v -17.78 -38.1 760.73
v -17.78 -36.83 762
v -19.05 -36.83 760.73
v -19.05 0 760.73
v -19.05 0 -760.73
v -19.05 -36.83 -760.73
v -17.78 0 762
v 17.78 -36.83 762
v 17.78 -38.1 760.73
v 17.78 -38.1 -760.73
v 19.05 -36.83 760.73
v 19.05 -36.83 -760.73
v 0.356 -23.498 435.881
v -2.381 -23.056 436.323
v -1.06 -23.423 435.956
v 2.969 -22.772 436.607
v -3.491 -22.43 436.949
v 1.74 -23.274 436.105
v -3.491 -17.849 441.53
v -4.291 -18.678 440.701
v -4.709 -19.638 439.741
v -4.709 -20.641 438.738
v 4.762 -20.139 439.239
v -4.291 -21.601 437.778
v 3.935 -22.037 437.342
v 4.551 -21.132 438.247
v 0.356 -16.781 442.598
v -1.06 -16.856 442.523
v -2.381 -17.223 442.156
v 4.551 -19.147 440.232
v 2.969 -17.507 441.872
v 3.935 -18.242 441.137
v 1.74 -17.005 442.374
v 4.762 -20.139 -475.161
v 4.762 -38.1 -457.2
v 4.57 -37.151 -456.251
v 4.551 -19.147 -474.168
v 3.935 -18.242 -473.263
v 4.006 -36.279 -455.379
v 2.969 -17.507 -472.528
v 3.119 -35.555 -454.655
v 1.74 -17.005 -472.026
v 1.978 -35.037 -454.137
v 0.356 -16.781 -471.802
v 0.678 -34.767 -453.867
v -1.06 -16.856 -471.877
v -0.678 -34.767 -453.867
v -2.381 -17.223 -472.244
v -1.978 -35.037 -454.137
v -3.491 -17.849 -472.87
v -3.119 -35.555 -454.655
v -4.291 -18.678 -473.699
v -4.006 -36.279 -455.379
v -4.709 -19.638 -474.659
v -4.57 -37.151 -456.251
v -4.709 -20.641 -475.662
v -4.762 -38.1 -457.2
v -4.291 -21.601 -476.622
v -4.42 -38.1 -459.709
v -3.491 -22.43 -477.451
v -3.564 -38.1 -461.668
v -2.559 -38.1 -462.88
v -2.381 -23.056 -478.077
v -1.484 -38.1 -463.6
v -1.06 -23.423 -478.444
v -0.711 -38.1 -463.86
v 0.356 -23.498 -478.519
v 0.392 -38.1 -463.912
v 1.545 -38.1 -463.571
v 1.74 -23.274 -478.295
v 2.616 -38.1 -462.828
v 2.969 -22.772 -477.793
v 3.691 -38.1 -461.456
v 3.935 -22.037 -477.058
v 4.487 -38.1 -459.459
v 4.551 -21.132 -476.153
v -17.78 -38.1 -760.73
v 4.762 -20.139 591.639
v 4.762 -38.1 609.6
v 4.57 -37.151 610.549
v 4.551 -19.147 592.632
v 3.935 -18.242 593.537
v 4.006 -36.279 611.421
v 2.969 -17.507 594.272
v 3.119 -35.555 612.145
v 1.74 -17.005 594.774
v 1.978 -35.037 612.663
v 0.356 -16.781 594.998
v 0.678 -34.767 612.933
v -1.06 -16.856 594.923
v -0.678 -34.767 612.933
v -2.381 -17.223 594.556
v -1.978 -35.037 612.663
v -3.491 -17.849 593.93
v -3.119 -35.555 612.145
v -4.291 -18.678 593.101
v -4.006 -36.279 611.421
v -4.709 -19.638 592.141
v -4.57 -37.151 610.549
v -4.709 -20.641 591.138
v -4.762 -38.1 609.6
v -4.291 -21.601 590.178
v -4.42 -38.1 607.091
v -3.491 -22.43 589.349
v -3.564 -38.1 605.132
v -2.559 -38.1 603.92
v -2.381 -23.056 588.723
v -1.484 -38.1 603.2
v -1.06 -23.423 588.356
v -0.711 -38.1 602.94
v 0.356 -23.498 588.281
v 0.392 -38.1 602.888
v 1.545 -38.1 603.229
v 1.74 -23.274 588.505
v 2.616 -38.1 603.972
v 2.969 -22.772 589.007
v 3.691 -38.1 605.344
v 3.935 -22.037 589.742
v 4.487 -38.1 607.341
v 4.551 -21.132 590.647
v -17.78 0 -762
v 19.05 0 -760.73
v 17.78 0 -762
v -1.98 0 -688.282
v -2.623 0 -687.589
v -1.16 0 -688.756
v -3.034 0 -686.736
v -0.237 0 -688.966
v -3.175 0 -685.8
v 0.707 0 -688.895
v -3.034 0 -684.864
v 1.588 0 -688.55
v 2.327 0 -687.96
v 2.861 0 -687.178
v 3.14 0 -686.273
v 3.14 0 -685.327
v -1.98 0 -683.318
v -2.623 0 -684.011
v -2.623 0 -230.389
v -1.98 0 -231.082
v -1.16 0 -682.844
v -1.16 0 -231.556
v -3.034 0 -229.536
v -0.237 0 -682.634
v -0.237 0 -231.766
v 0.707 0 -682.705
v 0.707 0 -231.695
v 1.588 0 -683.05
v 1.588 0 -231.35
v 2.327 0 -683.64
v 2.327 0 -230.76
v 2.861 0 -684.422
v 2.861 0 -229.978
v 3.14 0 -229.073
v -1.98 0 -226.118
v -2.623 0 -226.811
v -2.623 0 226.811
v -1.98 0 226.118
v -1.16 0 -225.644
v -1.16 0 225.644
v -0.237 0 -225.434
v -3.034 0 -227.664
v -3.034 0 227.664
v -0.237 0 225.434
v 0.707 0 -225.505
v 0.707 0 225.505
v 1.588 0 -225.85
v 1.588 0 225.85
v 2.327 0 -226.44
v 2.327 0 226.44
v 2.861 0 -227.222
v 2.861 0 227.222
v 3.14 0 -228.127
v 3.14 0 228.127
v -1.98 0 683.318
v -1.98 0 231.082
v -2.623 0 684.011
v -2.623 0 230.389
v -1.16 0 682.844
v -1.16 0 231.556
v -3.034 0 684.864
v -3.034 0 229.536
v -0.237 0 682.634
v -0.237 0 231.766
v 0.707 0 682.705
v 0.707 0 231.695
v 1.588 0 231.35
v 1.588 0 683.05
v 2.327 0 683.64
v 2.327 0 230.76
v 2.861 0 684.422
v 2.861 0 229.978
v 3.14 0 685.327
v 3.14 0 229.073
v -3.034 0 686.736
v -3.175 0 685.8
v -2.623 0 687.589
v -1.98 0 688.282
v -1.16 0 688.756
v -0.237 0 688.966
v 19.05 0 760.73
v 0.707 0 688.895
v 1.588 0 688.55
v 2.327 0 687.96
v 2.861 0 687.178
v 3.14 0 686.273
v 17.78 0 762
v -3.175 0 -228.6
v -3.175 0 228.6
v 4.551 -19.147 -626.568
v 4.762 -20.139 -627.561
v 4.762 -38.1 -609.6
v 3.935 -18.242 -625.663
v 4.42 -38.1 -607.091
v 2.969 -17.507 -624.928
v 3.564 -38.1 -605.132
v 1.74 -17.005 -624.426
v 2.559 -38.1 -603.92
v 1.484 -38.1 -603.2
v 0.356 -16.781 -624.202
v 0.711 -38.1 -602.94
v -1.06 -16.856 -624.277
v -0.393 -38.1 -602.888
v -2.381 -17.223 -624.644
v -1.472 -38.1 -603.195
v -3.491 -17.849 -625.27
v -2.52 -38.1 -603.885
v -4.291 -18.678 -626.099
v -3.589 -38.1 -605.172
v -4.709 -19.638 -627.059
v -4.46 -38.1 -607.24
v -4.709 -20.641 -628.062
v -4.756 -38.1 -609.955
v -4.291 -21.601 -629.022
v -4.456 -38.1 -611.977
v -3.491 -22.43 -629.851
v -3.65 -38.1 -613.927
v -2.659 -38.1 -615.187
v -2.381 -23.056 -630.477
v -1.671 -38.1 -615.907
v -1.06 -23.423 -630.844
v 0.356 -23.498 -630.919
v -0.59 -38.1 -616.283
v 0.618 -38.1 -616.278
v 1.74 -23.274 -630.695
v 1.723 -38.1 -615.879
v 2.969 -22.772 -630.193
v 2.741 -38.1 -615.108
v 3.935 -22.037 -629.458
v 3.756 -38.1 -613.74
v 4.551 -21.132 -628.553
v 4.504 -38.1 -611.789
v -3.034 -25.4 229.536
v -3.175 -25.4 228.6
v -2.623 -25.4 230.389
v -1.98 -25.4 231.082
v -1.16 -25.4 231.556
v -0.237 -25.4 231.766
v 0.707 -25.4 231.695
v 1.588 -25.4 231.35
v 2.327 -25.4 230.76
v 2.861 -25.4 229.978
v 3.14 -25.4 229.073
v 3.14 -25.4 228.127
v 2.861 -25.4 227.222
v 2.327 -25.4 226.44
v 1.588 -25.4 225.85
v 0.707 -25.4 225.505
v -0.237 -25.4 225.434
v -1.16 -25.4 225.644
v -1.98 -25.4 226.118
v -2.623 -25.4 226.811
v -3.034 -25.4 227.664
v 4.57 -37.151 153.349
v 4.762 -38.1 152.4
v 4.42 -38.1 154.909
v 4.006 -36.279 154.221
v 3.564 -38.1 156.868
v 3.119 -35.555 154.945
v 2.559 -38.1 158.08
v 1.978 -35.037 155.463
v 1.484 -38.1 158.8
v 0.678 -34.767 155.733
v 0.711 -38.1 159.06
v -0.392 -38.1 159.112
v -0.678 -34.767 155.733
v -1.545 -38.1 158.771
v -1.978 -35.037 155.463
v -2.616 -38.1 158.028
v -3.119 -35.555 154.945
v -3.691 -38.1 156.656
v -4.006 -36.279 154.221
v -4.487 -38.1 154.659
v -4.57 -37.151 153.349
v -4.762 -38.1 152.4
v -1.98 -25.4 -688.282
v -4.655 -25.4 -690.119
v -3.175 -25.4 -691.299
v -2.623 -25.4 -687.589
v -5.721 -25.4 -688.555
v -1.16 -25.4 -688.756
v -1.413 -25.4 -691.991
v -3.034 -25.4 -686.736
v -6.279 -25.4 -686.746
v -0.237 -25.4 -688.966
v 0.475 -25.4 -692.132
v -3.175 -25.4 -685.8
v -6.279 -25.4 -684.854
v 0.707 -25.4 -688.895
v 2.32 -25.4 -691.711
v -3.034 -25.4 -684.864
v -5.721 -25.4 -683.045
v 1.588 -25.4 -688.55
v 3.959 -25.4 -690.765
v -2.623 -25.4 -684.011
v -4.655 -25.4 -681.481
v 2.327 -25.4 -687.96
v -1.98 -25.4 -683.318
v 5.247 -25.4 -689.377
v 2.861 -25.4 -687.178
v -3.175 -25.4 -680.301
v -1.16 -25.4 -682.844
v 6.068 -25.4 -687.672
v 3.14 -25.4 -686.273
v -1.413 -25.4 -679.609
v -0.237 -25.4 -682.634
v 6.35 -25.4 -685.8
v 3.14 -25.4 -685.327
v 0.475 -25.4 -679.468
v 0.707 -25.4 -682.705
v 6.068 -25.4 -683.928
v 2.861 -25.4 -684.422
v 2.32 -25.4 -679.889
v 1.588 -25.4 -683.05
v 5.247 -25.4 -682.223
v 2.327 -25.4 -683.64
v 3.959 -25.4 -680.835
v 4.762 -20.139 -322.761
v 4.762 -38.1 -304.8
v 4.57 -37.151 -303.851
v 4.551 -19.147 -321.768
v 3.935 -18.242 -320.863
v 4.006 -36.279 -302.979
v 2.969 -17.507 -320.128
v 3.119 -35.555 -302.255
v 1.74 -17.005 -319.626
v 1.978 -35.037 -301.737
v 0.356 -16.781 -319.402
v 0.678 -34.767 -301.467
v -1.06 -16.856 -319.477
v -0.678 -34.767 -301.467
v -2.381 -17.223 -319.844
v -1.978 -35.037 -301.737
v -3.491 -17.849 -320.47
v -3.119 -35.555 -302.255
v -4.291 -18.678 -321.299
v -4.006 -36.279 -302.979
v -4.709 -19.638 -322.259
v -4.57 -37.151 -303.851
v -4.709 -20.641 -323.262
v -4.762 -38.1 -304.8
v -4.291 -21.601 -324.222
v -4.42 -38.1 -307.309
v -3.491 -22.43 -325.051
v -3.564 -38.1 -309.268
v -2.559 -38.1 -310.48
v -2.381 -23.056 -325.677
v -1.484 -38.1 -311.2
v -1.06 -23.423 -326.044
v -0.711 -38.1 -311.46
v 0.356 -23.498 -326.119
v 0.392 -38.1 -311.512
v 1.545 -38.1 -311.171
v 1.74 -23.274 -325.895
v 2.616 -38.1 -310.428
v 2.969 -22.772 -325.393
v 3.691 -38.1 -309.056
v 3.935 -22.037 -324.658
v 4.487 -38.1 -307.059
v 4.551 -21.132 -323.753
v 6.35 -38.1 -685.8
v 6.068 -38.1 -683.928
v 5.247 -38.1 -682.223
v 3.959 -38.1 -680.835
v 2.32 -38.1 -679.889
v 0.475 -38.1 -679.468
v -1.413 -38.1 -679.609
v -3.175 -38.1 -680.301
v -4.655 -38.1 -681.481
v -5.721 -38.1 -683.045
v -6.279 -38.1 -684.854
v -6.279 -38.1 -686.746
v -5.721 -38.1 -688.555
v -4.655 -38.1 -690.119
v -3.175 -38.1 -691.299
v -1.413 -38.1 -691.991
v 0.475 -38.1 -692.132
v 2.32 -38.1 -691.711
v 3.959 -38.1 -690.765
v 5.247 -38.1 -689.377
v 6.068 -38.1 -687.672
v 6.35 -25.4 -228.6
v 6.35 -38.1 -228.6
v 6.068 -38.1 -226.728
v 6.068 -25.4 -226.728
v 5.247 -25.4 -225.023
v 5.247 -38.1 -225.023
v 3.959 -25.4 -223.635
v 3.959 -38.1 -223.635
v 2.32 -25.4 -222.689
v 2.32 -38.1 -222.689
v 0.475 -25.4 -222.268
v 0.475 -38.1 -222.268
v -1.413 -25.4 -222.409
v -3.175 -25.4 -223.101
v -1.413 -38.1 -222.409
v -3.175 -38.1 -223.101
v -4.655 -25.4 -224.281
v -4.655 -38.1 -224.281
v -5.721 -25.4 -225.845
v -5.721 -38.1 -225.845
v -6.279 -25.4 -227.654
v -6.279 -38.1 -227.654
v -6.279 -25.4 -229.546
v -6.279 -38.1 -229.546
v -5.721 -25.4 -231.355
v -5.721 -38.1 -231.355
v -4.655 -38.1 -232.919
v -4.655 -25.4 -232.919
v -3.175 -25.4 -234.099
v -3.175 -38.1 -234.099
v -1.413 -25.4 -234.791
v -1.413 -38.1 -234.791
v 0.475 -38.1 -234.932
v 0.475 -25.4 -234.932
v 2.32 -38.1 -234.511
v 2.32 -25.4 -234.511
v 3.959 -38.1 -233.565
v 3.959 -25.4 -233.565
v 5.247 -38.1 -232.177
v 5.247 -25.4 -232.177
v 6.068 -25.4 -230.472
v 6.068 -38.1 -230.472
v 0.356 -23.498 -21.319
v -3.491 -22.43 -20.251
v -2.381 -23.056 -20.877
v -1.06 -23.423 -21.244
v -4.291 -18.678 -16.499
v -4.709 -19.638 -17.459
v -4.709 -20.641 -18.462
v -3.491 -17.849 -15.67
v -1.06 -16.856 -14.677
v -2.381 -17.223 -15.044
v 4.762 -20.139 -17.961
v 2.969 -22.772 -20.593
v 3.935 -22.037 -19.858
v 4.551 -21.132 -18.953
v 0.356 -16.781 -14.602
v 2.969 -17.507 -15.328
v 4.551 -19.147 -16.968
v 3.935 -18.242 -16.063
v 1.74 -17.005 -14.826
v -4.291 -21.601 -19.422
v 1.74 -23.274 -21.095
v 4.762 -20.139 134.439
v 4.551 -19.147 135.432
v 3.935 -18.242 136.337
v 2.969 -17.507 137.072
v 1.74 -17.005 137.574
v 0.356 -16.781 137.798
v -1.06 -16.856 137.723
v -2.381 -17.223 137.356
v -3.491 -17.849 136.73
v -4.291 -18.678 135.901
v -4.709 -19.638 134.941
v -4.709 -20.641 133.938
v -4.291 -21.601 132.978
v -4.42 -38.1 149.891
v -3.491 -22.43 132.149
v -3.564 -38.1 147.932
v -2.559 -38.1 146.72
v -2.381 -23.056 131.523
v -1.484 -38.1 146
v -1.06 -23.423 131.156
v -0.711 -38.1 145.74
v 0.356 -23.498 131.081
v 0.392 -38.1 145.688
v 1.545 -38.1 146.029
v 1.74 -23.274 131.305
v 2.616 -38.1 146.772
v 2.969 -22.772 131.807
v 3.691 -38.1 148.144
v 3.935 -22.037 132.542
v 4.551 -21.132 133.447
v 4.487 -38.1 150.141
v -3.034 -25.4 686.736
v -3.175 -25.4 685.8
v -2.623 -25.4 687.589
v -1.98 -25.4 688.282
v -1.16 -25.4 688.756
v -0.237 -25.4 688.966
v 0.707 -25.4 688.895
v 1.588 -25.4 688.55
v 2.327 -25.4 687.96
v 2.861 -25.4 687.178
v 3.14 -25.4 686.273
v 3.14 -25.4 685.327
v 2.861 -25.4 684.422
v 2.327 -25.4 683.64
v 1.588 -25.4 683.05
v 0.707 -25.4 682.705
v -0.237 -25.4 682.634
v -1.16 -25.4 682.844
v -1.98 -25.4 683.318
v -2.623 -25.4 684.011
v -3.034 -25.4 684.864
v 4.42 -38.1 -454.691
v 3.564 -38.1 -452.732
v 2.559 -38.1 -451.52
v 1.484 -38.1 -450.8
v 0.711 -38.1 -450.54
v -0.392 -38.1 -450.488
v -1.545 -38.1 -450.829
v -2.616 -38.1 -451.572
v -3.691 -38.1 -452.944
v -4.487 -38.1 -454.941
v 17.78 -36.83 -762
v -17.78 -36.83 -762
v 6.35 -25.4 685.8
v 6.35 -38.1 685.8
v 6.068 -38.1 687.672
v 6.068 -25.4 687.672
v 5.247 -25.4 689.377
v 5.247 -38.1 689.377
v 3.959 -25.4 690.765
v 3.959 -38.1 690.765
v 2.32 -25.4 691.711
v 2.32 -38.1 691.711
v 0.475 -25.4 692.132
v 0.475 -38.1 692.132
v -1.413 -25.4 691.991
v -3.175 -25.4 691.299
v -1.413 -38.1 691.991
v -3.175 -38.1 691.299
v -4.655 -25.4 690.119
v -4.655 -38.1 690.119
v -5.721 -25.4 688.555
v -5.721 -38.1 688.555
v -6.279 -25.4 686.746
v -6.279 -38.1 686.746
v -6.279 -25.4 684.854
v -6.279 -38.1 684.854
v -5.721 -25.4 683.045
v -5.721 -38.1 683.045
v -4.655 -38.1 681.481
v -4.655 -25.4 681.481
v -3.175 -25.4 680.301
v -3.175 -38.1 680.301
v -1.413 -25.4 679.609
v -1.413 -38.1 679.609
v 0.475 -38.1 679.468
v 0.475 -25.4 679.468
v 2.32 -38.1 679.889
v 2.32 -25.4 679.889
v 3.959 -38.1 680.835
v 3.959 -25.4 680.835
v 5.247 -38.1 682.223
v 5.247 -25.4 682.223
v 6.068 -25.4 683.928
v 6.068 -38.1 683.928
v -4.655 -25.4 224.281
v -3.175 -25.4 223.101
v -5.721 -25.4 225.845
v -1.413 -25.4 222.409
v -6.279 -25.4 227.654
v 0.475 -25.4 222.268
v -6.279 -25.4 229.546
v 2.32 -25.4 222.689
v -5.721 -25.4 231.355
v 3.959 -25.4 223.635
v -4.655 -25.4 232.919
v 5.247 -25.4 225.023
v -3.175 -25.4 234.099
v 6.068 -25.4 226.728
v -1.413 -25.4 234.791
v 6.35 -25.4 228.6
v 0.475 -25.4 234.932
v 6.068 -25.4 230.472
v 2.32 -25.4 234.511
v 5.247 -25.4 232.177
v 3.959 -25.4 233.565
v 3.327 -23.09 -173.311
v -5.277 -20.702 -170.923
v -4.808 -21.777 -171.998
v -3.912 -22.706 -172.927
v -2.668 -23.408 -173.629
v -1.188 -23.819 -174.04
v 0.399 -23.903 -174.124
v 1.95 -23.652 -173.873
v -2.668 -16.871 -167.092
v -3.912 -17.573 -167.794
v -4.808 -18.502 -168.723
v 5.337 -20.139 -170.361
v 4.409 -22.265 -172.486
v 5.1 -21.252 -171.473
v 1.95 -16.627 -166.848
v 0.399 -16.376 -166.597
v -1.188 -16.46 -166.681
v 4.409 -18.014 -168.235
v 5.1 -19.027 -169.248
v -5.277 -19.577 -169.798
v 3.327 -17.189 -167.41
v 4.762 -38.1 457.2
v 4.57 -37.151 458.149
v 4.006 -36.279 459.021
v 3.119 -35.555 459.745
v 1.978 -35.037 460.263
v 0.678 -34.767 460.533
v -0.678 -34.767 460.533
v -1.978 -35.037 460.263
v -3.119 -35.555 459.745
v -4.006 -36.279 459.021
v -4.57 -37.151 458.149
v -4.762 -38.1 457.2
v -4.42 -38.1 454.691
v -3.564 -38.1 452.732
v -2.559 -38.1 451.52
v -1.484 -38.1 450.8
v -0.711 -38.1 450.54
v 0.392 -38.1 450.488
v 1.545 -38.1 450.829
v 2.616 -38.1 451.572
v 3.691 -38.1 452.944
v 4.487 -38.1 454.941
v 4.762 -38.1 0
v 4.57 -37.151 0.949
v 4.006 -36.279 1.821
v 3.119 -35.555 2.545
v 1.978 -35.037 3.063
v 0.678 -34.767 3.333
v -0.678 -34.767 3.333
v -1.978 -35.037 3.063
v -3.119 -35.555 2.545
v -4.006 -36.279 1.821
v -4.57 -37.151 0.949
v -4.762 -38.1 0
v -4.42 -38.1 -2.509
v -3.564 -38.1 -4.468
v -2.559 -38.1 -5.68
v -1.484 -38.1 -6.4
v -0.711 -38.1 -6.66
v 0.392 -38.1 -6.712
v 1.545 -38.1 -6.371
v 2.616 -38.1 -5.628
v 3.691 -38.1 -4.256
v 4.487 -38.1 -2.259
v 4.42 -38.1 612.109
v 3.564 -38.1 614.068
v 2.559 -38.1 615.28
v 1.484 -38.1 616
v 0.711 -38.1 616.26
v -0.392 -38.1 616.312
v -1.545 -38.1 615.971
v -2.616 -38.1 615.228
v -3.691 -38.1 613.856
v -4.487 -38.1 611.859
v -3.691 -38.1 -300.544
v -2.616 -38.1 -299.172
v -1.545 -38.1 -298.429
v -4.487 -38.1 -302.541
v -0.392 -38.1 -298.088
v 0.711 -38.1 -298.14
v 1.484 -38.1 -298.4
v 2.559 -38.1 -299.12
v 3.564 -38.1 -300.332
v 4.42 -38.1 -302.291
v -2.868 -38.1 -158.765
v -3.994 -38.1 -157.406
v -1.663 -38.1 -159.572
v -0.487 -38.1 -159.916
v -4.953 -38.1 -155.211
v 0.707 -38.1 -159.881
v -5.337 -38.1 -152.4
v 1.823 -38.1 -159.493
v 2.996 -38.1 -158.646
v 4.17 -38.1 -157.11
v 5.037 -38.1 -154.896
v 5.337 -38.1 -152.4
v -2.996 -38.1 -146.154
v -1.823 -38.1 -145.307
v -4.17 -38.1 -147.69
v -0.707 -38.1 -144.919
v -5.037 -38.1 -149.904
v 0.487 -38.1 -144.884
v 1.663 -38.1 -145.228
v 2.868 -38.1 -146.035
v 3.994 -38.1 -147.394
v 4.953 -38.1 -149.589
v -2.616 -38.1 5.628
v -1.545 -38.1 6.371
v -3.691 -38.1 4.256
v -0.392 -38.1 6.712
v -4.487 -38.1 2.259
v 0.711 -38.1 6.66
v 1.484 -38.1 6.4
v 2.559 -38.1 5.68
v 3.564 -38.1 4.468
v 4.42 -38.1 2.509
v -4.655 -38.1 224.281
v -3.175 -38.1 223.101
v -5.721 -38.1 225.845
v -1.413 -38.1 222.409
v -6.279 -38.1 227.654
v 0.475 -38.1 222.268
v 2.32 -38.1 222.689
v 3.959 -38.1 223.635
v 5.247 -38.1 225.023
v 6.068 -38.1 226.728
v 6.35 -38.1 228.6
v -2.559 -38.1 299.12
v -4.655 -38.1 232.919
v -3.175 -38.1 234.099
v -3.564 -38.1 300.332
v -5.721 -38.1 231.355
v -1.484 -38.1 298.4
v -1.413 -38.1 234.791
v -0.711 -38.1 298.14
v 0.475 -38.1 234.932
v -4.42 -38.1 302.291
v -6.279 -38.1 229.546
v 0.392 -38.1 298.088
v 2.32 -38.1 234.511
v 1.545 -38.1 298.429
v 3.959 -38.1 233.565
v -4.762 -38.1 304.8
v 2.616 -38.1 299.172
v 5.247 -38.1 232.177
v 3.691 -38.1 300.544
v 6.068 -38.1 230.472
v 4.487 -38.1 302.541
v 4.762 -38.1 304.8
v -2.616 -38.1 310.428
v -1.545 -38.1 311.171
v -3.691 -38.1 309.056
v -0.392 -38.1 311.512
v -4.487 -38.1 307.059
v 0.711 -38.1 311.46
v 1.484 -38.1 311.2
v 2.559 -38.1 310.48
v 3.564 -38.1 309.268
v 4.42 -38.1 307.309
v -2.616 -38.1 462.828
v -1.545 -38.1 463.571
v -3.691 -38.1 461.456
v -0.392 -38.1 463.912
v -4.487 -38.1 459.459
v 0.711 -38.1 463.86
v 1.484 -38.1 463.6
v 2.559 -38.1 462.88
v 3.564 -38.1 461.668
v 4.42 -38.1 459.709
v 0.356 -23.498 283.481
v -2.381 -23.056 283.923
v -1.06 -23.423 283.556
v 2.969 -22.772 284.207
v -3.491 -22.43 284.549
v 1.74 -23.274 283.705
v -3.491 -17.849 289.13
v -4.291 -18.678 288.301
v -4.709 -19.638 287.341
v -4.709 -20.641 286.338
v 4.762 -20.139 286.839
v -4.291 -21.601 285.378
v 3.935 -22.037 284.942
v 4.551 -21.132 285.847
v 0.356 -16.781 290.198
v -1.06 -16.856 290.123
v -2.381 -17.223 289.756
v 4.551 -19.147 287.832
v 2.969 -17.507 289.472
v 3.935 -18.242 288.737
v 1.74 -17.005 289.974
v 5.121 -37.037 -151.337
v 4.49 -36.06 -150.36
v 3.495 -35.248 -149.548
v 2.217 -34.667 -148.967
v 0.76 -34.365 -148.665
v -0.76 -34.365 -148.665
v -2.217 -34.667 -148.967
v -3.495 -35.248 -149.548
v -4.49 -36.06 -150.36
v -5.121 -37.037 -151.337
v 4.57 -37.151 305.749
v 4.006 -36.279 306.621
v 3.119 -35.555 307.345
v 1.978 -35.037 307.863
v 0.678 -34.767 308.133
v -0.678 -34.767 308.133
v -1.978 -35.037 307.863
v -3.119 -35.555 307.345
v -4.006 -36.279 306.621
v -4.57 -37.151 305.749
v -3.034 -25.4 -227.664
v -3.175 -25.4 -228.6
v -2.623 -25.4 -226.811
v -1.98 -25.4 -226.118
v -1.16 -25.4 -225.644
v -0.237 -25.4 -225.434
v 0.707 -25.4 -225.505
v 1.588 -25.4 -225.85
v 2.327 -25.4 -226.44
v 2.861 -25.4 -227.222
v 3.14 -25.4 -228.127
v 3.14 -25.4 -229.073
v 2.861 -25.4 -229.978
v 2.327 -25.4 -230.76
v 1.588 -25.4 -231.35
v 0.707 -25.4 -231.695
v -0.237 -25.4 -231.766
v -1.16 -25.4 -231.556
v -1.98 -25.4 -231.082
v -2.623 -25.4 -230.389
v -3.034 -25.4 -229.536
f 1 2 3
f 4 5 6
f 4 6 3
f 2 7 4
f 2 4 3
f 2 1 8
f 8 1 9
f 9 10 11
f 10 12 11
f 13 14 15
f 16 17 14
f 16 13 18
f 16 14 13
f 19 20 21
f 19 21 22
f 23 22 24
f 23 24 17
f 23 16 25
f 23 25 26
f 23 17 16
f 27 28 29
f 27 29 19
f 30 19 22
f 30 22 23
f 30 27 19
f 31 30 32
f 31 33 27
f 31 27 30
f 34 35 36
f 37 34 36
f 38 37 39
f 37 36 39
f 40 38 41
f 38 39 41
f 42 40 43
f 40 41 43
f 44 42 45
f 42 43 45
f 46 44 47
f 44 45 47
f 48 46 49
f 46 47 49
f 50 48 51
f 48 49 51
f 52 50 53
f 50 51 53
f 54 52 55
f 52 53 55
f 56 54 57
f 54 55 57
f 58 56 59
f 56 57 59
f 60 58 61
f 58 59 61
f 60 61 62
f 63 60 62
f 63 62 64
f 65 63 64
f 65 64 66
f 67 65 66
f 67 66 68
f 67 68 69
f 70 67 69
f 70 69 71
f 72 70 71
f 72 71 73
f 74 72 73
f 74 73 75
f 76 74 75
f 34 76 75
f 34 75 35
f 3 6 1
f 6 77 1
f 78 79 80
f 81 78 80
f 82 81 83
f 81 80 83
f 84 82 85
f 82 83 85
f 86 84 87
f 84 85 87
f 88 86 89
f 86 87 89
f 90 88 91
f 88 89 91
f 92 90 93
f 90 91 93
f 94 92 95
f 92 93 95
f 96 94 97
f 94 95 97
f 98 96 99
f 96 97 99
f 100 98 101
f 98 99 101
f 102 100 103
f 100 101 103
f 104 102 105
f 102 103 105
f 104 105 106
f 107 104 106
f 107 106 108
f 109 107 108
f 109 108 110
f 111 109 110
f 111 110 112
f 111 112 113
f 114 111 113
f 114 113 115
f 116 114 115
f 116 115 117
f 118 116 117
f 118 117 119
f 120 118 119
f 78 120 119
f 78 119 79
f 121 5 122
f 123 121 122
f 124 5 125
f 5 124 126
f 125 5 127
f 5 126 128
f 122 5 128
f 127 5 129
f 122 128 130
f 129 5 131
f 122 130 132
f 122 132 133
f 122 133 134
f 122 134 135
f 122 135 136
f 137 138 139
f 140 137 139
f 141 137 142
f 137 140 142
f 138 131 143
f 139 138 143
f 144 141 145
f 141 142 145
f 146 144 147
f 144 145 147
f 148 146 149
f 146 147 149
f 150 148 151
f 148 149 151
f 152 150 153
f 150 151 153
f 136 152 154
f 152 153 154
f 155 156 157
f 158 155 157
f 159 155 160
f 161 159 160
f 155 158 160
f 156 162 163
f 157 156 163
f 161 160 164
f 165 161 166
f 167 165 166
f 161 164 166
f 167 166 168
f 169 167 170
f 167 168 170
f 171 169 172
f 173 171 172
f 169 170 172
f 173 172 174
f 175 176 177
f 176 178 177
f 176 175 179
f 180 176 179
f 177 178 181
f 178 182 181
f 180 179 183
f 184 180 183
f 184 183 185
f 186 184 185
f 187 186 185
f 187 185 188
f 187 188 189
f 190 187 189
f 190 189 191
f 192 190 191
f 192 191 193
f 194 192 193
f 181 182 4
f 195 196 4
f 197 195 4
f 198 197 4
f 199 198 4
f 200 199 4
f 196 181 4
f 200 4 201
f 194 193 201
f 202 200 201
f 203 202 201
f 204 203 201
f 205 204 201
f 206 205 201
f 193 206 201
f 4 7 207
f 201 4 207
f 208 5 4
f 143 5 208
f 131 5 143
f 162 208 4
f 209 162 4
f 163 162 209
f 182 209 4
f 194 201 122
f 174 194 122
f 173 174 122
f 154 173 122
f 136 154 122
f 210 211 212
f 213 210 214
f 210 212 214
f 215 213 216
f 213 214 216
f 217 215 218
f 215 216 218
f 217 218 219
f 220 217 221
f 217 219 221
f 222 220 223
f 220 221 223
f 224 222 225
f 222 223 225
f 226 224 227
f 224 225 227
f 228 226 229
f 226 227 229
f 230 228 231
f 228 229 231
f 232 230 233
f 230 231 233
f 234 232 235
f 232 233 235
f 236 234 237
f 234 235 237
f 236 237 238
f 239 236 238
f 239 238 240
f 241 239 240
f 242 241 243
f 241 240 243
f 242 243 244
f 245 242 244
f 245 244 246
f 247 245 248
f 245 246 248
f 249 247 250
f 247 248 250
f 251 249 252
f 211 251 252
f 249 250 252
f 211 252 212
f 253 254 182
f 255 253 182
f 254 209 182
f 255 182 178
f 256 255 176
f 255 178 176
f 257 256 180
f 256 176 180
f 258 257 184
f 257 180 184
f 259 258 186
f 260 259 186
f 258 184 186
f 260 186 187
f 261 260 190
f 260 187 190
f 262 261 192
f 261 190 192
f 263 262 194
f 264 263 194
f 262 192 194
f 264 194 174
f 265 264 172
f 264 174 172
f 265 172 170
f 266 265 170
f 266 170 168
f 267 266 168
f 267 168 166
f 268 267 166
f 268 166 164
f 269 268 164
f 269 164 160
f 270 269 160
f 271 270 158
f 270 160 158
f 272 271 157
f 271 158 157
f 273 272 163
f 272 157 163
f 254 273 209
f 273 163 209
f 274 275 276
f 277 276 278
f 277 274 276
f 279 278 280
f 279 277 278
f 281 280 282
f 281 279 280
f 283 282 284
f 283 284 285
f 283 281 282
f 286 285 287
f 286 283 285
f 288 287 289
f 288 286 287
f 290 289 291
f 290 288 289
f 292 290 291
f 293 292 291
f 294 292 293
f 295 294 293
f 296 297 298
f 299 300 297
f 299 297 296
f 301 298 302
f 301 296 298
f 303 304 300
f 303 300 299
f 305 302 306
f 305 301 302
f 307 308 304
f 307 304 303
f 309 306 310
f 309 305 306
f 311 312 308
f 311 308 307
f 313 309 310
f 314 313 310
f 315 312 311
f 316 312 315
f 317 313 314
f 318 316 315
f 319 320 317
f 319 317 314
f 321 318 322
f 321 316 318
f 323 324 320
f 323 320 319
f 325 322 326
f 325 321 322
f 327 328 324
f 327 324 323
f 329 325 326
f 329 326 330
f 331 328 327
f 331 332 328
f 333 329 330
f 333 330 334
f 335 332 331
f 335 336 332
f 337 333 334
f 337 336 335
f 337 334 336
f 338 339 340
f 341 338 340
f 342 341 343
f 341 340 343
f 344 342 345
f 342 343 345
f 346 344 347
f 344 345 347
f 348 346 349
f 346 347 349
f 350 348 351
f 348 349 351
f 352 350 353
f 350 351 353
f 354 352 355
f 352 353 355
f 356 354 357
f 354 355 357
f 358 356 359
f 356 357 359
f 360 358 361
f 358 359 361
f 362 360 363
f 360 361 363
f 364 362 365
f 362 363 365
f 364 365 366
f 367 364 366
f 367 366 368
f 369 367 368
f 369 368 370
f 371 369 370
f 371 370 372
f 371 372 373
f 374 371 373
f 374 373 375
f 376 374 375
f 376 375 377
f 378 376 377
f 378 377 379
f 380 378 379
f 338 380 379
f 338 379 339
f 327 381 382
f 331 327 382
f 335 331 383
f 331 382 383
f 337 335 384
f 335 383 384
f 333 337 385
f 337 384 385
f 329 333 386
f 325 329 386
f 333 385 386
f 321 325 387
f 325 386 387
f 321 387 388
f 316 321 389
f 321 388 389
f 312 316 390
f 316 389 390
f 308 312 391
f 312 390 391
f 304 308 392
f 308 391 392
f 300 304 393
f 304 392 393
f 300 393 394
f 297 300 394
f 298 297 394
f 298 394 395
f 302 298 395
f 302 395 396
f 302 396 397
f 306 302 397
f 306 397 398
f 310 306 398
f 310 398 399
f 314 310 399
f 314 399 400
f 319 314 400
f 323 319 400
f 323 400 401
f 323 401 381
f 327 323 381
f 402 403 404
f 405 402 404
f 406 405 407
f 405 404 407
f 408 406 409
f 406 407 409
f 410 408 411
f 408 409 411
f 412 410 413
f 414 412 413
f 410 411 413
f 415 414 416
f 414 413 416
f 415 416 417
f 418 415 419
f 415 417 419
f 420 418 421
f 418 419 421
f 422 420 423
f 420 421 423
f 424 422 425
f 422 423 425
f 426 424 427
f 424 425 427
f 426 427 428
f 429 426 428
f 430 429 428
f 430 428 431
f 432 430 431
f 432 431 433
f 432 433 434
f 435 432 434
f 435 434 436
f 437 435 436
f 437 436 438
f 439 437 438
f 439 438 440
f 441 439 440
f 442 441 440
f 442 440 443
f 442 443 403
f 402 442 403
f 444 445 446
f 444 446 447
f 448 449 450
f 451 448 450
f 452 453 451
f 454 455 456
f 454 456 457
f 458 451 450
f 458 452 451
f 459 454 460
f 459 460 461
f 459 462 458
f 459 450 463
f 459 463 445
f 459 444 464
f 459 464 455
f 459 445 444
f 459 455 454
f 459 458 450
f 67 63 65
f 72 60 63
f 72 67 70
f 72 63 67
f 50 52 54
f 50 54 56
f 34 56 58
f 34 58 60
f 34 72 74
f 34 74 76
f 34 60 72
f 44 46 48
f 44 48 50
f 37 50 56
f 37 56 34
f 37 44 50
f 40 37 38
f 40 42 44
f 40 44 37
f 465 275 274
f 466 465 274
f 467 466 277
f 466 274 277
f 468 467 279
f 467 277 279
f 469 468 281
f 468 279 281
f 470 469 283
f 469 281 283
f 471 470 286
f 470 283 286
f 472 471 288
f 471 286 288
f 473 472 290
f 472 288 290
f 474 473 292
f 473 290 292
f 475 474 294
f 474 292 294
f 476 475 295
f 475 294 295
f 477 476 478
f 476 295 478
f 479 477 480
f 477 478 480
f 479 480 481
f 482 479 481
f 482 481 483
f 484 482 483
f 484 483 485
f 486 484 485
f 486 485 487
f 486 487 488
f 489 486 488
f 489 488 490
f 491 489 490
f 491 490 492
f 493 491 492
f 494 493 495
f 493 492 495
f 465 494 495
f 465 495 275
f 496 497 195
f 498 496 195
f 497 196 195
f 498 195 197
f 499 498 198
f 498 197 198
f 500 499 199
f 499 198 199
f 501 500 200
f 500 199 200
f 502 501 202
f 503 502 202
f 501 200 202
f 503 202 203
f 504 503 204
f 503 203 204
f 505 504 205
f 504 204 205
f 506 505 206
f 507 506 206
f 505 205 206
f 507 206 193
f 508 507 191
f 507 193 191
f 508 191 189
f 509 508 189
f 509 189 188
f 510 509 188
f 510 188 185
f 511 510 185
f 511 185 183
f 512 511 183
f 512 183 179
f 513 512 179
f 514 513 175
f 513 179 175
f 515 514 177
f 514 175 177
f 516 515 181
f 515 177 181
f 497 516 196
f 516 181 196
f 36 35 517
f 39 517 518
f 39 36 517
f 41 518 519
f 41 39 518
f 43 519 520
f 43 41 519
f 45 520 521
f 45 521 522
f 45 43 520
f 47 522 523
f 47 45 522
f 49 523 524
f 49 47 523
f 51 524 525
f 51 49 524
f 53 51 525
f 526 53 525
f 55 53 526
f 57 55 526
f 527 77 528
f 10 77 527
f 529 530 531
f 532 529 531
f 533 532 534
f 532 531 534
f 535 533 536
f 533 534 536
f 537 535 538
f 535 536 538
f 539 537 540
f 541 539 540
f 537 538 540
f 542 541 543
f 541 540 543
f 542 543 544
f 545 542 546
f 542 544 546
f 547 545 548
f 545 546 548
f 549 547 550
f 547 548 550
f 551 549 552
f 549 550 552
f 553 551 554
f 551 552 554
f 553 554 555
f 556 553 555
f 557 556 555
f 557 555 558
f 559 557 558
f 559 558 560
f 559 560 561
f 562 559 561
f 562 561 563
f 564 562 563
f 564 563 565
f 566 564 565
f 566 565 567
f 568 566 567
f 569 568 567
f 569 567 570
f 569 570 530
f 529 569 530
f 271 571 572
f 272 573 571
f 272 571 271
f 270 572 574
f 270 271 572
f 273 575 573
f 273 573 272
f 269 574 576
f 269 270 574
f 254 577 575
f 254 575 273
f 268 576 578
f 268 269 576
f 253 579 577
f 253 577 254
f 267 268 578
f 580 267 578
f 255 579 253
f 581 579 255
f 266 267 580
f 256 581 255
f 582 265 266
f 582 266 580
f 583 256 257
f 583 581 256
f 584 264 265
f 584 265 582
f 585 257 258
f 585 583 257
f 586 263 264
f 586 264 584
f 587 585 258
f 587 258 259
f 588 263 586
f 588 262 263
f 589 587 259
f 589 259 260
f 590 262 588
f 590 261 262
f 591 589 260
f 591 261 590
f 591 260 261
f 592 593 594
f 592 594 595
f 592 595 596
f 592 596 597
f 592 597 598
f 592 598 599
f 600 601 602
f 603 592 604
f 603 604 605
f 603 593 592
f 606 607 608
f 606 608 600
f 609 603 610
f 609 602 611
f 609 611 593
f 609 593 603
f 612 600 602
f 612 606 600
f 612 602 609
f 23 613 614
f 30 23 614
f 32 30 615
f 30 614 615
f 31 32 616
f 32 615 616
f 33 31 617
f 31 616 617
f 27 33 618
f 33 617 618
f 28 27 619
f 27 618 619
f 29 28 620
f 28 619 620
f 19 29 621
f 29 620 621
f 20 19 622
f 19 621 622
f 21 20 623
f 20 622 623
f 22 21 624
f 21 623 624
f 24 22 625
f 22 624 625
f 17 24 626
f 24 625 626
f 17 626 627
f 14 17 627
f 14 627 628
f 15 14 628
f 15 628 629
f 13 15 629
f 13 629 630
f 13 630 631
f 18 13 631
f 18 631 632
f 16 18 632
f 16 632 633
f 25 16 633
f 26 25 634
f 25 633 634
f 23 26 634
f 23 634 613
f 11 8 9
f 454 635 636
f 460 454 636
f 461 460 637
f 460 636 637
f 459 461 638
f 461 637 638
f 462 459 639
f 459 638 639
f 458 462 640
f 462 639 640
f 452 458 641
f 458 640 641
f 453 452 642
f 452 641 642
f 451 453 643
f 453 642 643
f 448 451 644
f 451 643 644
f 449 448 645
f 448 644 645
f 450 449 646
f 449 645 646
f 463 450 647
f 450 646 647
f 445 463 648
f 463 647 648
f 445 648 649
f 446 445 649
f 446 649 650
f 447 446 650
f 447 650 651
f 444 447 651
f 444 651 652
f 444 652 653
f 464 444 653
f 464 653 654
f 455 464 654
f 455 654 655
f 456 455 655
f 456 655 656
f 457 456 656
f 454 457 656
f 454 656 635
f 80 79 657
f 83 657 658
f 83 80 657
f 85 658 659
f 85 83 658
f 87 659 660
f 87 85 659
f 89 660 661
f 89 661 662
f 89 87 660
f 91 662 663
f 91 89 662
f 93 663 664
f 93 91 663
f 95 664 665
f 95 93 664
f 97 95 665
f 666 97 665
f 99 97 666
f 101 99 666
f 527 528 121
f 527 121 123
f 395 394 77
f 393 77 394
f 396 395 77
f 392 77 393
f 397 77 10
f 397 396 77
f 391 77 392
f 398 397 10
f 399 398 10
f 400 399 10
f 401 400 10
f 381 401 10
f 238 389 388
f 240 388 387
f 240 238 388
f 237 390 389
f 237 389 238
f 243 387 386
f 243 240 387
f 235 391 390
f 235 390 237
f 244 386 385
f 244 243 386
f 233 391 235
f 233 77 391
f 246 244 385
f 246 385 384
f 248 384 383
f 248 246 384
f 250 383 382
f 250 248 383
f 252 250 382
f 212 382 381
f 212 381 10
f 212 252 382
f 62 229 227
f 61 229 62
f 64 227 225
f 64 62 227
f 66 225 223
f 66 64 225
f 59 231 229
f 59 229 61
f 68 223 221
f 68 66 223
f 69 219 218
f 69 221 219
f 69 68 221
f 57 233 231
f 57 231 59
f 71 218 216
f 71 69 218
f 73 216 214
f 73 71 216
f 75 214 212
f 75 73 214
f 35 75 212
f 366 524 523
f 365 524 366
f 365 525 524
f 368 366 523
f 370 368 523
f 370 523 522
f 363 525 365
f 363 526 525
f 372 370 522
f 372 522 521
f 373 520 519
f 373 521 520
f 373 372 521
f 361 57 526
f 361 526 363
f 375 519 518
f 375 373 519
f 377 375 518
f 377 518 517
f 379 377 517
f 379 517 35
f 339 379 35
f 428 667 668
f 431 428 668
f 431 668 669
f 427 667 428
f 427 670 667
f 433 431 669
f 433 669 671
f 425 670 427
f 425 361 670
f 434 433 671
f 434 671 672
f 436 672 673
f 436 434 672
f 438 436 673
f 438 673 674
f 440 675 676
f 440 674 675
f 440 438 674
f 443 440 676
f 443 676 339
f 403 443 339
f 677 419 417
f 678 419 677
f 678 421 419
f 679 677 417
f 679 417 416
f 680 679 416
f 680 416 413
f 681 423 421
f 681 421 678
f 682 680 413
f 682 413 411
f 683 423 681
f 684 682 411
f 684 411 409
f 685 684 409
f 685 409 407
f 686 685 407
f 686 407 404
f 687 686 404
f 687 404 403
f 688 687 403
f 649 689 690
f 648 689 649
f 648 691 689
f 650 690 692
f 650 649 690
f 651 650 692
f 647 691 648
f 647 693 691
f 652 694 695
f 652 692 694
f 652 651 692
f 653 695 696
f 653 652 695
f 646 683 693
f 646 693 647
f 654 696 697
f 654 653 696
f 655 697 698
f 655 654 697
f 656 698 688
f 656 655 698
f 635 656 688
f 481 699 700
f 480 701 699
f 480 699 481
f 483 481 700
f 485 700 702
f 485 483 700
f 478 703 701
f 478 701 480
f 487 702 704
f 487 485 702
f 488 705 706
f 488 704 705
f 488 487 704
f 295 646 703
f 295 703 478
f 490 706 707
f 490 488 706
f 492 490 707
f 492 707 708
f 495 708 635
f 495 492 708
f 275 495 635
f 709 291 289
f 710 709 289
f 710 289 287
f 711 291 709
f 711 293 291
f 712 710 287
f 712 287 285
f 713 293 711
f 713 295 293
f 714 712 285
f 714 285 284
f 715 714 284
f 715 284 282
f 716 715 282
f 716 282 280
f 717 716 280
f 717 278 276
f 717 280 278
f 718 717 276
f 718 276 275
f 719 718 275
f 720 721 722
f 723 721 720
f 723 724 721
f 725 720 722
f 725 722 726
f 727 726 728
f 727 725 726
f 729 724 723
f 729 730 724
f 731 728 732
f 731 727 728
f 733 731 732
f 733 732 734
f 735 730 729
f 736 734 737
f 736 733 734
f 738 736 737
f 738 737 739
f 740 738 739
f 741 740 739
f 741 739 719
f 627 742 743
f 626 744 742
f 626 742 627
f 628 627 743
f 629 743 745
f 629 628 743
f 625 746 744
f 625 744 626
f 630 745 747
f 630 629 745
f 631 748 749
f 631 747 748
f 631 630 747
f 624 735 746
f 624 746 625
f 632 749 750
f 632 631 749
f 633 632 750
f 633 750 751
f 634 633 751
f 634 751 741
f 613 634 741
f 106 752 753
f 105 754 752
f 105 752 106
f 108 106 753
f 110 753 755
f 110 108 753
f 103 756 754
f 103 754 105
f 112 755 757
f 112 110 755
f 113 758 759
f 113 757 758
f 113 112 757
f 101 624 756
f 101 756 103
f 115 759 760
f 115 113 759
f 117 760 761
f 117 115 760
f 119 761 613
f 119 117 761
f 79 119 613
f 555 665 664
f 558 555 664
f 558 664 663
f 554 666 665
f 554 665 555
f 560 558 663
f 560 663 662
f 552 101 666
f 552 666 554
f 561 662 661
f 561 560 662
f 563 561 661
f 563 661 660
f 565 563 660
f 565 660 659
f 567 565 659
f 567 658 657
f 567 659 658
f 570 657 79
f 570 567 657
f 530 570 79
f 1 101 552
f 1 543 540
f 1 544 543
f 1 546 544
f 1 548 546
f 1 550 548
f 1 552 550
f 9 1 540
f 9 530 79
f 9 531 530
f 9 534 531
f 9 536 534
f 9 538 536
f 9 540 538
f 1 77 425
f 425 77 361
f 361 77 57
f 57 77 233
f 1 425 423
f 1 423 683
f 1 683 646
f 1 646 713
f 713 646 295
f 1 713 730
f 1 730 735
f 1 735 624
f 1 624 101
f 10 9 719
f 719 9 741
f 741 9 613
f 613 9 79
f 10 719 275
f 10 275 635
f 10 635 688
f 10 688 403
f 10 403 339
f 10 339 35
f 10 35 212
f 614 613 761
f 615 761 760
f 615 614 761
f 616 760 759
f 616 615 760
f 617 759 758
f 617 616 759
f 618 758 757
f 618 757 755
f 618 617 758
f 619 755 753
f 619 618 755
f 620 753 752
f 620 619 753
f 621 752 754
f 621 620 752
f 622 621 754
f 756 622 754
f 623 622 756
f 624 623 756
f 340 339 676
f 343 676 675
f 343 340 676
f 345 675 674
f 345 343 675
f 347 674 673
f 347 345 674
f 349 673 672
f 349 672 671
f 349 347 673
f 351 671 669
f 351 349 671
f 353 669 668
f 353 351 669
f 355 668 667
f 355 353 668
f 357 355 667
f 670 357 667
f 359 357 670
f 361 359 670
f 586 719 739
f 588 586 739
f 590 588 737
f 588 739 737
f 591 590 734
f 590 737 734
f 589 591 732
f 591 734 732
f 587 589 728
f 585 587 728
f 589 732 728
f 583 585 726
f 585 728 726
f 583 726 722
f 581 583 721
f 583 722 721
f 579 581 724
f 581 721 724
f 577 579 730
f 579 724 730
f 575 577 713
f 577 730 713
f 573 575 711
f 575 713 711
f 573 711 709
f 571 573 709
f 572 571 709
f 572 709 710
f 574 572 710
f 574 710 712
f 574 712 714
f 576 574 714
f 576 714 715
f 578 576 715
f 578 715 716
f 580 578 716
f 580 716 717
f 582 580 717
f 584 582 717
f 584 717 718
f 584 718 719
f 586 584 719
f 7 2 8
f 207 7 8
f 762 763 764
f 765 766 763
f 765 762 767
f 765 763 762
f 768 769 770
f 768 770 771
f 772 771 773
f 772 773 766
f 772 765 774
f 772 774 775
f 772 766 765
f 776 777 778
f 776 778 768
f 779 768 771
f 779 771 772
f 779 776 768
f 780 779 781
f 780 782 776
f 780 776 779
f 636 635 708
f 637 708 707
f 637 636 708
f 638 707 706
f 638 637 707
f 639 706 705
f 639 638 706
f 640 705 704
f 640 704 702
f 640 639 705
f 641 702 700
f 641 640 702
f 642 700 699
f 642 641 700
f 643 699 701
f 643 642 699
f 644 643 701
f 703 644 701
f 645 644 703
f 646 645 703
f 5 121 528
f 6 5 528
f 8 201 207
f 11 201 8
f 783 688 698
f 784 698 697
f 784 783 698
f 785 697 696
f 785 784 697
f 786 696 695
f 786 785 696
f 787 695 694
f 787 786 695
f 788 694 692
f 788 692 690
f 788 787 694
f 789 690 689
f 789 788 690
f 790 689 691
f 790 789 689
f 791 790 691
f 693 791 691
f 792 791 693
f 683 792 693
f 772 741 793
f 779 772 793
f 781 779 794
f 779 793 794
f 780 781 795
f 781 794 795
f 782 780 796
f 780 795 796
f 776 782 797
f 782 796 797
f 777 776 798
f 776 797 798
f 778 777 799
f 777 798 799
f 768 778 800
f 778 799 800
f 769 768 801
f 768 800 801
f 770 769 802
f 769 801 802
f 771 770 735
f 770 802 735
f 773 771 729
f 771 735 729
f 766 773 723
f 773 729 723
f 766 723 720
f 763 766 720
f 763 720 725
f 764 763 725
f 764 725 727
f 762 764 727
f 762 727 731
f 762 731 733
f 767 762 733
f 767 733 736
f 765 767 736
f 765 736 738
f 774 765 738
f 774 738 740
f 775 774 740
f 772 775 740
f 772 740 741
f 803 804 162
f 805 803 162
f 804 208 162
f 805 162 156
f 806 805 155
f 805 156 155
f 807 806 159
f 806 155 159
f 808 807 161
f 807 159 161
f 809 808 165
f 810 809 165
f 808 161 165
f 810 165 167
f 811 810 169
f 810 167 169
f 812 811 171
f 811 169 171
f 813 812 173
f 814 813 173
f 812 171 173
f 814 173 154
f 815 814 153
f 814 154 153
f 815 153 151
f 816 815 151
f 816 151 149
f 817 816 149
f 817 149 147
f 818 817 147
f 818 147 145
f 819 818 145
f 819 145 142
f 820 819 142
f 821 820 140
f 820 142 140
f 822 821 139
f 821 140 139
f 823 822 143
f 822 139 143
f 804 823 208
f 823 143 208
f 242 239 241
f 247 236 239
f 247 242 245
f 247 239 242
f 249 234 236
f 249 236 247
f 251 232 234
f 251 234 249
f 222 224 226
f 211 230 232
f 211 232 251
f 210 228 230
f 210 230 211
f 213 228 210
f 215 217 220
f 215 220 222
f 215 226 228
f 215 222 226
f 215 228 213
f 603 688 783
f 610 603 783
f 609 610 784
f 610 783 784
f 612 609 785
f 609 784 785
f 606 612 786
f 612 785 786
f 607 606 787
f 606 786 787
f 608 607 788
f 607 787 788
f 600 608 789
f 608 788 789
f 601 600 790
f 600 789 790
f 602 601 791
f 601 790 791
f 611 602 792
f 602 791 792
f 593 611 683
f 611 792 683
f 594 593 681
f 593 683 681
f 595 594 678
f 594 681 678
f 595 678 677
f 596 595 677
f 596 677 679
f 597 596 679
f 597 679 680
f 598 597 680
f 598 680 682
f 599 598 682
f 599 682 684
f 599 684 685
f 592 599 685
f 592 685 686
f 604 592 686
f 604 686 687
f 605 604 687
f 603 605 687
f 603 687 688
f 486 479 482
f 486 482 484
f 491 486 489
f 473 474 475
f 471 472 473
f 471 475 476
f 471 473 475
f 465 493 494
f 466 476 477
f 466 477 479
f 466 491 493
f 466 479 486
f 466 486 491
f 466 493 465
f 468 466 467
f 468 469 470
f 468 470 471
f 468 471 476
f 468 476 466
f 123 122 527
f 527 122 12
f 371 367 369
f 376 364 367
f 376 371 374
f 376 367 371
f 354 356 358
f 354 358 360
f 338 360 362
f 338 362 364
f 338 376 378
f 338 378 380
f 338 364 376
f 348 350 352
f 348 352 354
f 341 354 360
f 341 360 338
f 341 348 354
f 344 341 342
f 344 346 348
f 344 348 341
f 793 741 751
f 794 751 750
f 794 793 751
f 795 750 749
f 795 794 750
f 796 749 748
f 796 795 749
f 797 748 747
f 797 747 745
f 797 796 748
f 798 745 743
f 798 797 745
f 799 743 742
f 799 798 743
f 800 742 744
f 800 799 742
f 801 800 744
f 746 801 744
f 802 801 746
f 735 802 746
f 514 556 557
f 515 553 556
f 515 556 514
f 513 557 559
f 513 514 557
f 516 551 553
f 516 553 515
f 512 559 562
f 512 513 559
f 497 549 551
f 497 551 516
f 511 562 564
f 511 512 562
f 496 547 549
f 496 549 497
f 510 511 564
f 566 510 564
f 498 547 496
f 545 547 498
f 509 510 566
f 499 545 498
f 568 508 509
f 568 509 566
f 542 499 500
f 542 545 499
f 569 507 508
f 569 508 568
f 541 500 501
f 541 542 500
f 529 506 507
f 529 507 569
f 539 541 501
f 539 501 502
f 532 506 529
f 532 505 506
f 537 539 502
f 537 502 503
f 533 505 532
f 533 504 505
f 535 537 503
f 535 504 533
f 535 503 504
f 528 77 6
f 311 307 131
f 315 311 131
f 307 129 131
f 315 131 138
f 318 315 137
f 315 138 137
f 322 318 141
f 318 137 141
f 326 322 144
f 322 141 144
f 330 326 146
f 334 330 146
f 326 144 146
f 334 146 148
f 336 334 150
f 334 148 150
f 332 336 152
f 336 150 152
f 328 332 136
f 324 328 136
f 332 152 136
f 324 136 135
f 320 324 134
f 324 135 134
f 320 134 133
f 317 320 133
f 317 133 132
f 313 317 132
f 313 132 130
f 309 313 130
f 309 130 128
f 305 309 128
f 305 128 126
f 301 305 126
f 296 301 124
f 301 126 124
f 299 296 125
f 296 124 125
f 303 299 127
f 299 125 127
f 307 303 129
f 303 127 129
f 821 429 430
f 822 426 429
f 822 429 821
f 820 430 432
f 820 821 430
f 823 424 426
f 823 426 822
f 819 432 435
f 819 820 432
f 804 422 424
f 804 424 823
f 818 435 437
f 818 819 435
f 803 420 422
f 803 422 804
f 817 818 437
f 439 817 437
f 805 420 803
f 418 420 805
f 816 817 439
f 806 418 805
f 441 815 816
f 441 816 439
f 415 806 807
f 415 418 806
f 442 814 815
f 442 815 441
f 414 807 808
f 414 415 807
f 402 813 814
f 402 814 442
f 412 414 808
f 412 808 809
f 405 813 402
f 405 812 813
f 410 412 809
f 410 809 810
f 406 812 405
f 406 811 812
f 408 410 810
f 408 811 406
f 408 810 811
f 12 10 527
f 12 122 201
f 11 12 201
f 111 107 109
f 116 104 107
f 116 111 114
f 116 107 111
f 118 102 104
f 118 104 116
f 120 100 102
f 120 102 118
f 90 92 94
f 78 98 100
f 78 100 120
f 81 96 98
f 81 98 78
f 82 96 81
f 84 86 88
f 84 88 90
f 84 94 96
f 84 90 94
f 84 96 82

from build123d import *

# Parameters (mm, degrees)
F0_W            = 38.1
F0_H            = 1524
F1_DEPTH        = 38.1
F4_R            = 4.7625
F6_R            = 4.7625
F8_R            = 4.7625
F10_R           = 4.7625
F12_R           = 4.7625
F14_R           = 5.336808
F16_R           = 4.7625
F18_R           = 4.7625
F20_R           = 4.7625
F21_DEPTH       = 25.4
F22_SIZE        = 1.27
F23_D           = 6.35
F23_CBORE_D     = 12.7
F23_CBORE_DEPTH = 12.7


with BuildPart() as f1:
    # F0 (on Front) → F1 (new body)
    with BuildSketch(Plane.XZ):
        Rectangle(F0_W, F0_H)
    extrude(amount=F1_DEPTH)

    # F4 (on face) + F6 (on face) + F8 (on face) + F10 (on face) + F12 (on face) + F14 (on face) + F16 (on face) + F18 (on face) + F20 (on face) → F21 (cut, symmetric)
    with BuildSketch(Plane(origin=(0, -323.85, 323.85), x_dir=(1, 0, 0), z_dir=(0, -0.707107, 0.707107))):
        with Locations((0, 404.111525)):
            Circle(F4_R)
    with BuildSketch(Plane(origin=(0, -247.65, 247.65), x_dir=(1, 0, 0), z_dir=(0, -0.707107, 0.707107))):
        with Locations((0, 296.348452)):
            Circle(F6_R)
    with BuildSketch(Plane(origin=(0, -171.45, 171.45), x_dir=(1, 0, 0), z_dir=(0, -0.707107, 0.707107))):
        with Locations((0, 188.585379)):
            Circle(F8_R)
    with BuildSketch(Plane(origin=(0, -95.25, 95.25), x_dir=(1, 0, 0), z_dir=(0, -0.707107, 0.707107))):
        with Locations((0, 80.822305)):
            Circle(F10_R)
    with BuildSketch(Plane(origin=(0, -19.05, 19.05), x_dir=(1, 0, 0), z_dir=(0, -0.707107, 0.707107))):
        with Locations((0, -26.940768)):
            Circle(F12_R)
    with BuildSketch(Plane(origin=(0, 57.15, -57.15), x_dir=(1, 0, 0), z_dir=(0, -0.707107, 0.707107))):
        with Locations((0, -134.703842)):
            Circle(F14_R)
    with BuildSketch(Plane(origin=(0, 133.35, -133.35), x_dir=(1, 0, 0), z_dir=(0, -0.707107, 0.707107))):
        with Locations((0, -242.466915)):
            Circle(F16_R)
    with BuildSketch(Plane(origin=(0, 209.55, -209.55), x_dir=(1, 0, 0), z_dir=(0, -0.707107, 0.707107))):
        with Locations((0, -350.229989)):
            Circle(F18_R)
    with BuildSketch(Plane(origin=(0, 285.75, -285.75), x_dir=(1, 0, 0), z_dir=(0, -0.707107, 0.707107))):
        with Locations((0, -457.993062)):
            Circle(F20_R)
    extrude(amount=F21_DEPTH, both=True, mode=Mode.SUBTRACT)

    # F22
    f22_edges = [f1.edges().sort_by_distance(p)[0] for p in [
        (19.05, -19.05, 762),
        (0, -38.1, 762),
        (-19.05, -19.05, 762),
        (19.05, -38.1, 0),
        (-19.05, -38.1, 0),
        (0, -38.1, -762),
        (19.05, -19.05, -762),
        (-19.05, -19.05, -762),
    ]]
    chamfer(f22_edges, length=F22_SIZE)

    # F23 (through all)
    with Locations(Plane.XZ.offset(38.1)):
        with Locations((0, 685.8), (0, 228.6), (0, -228.6), (0, -685.8)):
            CounterBoreHole(F23_D / 2, F23_CBORE_D / 2, F23_CBORE_DEPTH)


solid = f1.part
